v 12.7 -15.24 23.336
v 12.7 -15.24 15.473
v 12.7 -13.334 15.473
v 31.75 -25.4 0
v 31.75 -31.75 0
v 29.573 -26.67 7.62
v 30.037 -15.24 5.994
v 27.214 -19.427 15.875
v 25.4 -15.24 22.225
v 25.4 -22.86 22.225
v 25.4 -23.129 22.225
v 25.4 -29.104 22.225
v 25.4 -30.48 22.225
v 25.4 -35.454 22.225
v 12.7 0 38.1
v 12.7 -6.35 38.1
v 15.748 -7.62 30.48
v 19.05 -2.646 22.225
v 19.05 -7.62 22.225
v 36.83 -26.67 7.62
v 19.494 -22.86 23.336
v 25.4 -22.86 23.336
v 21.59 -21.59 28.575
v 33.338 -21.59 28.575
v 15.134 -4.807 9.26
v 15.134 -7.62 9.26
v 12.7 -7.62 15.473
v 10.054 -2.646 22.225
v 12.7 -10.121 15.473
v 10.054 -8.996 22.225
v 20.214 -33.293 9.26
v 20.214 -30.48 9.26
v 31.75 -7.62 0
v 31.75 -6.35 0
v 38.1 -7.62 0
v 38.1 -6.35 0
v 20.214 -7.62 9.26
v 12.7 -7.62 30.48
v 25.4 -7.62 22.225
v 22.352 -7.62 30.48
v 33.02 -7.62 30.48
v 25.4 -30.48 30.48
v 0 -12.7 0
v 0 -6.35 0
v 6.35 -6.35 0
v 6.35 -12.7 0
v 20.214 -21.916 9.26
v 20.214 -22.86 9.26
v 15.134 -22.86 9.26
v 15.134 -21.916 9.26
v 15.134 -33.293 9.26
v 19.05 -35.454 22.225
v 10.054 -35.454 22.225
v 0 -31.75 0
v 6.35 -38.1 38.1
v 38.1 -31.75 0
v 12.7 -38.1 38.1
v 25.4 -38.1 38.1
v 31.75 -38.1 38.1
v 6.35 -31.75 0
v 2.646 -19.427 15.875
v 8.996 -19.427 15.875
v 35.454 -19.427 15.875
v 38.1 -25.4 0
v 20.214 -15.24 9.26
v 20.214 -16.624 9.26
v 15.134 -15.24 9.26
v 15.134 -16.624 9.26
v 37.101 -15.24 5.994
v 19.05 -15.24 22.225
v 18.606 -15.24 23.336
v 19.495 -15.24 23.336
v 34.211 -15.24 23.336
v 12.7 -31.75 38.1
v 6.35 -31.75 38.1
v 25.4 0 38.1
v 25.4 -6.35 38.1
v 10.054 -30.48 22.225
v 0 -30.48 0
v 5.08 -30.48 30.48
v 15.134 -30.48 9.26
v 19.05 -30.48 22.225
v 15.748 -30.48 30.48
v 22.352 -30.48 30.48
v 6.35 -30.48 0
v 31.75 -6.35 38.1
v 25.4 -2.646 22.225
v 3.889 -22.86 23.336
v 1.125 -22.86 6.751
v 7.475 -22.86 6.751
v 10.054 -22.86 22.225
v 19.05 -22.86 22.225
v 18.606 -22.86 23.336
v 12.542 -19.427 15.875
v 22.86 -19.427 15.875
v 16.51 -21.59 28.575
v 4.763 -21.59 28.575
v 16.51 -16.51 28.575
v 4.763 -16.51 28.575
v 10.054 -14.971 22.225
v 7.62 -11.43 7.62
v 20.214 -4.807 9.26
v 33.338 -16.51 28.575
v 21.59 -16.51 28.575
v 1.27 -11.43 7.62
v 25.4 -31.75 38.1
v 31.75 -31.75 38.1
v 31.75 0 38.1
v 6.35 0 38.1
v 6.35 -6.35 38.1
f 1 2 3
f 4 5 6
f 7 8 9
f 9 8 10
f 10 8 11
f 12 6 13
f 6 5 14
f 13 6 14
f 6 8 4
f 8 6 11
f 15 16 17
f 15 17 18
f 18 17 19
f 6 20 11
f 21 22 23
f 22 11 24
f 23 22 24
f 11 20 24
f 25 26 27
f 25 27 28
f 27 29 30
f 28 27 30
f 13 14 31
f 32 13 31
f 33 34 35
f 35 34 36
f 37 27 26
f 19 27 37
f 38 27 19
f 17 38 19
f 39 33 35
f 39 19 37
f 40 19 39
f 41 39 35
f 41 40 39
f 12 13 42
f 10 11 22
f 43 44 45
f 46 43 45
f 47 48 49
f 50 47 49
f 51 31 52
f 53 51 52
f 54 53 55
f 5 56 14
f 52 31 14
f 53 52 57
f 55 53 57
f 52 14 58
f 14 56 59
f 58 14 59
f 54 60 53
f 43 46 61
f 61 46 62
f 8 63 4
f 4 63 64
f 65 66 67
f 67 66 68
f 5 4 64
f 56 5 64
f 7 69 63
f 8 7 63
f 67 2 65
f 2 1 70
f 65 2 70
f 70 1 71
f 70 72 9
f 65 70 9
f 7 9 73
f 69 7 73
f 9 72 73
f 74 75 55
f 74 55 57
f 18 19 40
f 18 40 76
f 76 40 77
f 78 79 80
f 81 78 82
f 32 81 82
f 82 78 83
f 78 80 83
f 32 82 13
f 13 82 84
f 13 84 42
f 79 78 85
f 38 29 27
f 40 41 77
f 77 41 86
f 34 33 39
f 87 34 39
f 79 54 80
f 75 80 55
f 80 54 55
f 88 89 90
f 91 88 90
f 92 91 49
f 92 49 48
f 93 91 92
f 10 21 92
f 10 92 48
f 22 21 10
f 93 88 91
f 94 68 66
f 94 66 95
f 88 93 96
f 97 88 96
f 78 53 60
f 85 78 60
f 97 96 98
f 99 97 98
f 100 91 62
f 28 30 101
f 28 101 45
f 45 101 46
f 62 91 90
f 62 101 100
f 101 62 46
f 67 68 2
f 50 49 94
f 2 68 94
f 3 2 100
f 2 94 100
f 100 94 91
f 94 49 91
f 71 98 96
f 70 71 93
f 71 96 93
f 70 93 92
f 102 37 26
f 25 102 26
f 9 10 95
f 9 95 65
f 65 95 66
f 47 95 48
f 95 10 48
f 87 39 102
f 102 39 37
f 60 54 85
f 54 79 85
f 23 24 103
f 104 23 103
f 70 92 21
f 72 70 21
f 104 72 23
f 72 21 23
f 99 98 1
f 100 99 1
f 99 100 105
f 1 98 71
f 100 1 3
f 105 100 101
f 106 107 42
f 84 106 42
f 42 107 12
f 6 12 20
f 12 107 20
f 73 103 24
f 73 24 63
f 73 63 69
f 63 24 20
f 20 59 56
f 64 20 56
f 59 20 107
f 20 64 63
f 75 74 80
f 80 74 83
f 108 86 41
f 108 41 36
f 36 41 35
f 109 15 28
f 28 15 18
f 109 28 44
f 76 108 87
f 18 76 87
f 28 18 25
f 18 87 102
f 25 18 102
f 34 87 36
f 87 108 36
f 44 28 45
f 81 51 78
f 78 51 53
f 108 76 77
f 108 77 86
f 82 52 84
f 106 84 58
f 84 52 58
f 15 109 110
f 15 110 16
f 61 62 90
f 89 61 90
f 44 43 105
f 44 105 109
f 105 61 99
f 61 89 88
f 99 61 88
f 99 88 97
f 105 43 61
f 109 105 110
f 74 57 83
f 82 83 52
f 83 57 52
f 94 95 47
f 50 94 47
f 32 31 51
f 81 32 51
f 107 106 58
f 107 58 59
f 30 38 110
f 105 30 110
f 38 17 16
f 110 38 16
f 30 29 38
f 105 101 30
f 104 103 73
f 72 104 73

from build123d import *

# Parameters (mm, degrees)
F0_W      = 38.1
F0_H      = 38.1
F1_DEPTH  = 38.1
F6_DEPTH  = 38.1
F8_DEPTH  = 38.1
F9_W      = 25.4
F9_H      = 7.62
F10_DEPTH = 38.1


with BuildPart() as f1:
    # F0 (on Front) → F1 (new body)
    with BuildSketch(Plane.XZ):
        with Locations((19.05, 19.05)):
            Rectangle(F0_W, F0_H)
    extrude(amount=F1_DEPTH)

    # F5 (on offset) → F6 (cut)
    with BuildSketch(Plane.YZ.offset(38.1)):
        Polygon((-11.43, 7.62), (-6.35, 38.1), (-31.75, 38.1), (-26.67, 7.62), (-21.59, 28.575), (-16.51, 28.575), align=None)
        Polygon((-31.75, 0), (-38.1, 38.1), (-38.1, 0), align=None)
        Polygon((-25.4, 0), (-12.7, 0), (-19.427248, 15.875), align=None)
        Polygon((-6.35, 0), (0, 0), (0, 38.1), align=None)
    extrude(amount=-F6_DEPTH, mode=Mode.SUBTRACT)

    # F7 (on offset) → F8 (cut)
    with BuildSketch(Plane.XZ.offset(38.1)):
        Polygon((10.054167, 22.225), (6.35, 0), (31.75, 0), (25.4, 22.225), (20.214167, 9.260417), (15.134167, 9.260417), align=None)
        Polygon((0, 38.1), (0, 0), (6.35, 38.1), align=None)
        Polygon((25.4, 38.1), (12.7, 38.1), (19.05, 22.225), align=None)
        Polygon((31.75, 38.1), (38.1, 0), (38.1, 38.1), align=None)
    extrude(amount=-F8_DEPTH, mode=Mode.SUBTRACT)

    # F9 (on offset) → F10 (cut)
    with BuildSketch(Plane.XY.offset(38.1)):
        with Locations((25.4, -11.43)):
            Rectangle(F9_W, F9_H)
        with Locations((12.7, -26.67)):
            Rectangle(F9_W, F9_H)
    extrude(amount=-F10_DEPTH, mode=Mode.SUBTRACT)


solid = f1.part
